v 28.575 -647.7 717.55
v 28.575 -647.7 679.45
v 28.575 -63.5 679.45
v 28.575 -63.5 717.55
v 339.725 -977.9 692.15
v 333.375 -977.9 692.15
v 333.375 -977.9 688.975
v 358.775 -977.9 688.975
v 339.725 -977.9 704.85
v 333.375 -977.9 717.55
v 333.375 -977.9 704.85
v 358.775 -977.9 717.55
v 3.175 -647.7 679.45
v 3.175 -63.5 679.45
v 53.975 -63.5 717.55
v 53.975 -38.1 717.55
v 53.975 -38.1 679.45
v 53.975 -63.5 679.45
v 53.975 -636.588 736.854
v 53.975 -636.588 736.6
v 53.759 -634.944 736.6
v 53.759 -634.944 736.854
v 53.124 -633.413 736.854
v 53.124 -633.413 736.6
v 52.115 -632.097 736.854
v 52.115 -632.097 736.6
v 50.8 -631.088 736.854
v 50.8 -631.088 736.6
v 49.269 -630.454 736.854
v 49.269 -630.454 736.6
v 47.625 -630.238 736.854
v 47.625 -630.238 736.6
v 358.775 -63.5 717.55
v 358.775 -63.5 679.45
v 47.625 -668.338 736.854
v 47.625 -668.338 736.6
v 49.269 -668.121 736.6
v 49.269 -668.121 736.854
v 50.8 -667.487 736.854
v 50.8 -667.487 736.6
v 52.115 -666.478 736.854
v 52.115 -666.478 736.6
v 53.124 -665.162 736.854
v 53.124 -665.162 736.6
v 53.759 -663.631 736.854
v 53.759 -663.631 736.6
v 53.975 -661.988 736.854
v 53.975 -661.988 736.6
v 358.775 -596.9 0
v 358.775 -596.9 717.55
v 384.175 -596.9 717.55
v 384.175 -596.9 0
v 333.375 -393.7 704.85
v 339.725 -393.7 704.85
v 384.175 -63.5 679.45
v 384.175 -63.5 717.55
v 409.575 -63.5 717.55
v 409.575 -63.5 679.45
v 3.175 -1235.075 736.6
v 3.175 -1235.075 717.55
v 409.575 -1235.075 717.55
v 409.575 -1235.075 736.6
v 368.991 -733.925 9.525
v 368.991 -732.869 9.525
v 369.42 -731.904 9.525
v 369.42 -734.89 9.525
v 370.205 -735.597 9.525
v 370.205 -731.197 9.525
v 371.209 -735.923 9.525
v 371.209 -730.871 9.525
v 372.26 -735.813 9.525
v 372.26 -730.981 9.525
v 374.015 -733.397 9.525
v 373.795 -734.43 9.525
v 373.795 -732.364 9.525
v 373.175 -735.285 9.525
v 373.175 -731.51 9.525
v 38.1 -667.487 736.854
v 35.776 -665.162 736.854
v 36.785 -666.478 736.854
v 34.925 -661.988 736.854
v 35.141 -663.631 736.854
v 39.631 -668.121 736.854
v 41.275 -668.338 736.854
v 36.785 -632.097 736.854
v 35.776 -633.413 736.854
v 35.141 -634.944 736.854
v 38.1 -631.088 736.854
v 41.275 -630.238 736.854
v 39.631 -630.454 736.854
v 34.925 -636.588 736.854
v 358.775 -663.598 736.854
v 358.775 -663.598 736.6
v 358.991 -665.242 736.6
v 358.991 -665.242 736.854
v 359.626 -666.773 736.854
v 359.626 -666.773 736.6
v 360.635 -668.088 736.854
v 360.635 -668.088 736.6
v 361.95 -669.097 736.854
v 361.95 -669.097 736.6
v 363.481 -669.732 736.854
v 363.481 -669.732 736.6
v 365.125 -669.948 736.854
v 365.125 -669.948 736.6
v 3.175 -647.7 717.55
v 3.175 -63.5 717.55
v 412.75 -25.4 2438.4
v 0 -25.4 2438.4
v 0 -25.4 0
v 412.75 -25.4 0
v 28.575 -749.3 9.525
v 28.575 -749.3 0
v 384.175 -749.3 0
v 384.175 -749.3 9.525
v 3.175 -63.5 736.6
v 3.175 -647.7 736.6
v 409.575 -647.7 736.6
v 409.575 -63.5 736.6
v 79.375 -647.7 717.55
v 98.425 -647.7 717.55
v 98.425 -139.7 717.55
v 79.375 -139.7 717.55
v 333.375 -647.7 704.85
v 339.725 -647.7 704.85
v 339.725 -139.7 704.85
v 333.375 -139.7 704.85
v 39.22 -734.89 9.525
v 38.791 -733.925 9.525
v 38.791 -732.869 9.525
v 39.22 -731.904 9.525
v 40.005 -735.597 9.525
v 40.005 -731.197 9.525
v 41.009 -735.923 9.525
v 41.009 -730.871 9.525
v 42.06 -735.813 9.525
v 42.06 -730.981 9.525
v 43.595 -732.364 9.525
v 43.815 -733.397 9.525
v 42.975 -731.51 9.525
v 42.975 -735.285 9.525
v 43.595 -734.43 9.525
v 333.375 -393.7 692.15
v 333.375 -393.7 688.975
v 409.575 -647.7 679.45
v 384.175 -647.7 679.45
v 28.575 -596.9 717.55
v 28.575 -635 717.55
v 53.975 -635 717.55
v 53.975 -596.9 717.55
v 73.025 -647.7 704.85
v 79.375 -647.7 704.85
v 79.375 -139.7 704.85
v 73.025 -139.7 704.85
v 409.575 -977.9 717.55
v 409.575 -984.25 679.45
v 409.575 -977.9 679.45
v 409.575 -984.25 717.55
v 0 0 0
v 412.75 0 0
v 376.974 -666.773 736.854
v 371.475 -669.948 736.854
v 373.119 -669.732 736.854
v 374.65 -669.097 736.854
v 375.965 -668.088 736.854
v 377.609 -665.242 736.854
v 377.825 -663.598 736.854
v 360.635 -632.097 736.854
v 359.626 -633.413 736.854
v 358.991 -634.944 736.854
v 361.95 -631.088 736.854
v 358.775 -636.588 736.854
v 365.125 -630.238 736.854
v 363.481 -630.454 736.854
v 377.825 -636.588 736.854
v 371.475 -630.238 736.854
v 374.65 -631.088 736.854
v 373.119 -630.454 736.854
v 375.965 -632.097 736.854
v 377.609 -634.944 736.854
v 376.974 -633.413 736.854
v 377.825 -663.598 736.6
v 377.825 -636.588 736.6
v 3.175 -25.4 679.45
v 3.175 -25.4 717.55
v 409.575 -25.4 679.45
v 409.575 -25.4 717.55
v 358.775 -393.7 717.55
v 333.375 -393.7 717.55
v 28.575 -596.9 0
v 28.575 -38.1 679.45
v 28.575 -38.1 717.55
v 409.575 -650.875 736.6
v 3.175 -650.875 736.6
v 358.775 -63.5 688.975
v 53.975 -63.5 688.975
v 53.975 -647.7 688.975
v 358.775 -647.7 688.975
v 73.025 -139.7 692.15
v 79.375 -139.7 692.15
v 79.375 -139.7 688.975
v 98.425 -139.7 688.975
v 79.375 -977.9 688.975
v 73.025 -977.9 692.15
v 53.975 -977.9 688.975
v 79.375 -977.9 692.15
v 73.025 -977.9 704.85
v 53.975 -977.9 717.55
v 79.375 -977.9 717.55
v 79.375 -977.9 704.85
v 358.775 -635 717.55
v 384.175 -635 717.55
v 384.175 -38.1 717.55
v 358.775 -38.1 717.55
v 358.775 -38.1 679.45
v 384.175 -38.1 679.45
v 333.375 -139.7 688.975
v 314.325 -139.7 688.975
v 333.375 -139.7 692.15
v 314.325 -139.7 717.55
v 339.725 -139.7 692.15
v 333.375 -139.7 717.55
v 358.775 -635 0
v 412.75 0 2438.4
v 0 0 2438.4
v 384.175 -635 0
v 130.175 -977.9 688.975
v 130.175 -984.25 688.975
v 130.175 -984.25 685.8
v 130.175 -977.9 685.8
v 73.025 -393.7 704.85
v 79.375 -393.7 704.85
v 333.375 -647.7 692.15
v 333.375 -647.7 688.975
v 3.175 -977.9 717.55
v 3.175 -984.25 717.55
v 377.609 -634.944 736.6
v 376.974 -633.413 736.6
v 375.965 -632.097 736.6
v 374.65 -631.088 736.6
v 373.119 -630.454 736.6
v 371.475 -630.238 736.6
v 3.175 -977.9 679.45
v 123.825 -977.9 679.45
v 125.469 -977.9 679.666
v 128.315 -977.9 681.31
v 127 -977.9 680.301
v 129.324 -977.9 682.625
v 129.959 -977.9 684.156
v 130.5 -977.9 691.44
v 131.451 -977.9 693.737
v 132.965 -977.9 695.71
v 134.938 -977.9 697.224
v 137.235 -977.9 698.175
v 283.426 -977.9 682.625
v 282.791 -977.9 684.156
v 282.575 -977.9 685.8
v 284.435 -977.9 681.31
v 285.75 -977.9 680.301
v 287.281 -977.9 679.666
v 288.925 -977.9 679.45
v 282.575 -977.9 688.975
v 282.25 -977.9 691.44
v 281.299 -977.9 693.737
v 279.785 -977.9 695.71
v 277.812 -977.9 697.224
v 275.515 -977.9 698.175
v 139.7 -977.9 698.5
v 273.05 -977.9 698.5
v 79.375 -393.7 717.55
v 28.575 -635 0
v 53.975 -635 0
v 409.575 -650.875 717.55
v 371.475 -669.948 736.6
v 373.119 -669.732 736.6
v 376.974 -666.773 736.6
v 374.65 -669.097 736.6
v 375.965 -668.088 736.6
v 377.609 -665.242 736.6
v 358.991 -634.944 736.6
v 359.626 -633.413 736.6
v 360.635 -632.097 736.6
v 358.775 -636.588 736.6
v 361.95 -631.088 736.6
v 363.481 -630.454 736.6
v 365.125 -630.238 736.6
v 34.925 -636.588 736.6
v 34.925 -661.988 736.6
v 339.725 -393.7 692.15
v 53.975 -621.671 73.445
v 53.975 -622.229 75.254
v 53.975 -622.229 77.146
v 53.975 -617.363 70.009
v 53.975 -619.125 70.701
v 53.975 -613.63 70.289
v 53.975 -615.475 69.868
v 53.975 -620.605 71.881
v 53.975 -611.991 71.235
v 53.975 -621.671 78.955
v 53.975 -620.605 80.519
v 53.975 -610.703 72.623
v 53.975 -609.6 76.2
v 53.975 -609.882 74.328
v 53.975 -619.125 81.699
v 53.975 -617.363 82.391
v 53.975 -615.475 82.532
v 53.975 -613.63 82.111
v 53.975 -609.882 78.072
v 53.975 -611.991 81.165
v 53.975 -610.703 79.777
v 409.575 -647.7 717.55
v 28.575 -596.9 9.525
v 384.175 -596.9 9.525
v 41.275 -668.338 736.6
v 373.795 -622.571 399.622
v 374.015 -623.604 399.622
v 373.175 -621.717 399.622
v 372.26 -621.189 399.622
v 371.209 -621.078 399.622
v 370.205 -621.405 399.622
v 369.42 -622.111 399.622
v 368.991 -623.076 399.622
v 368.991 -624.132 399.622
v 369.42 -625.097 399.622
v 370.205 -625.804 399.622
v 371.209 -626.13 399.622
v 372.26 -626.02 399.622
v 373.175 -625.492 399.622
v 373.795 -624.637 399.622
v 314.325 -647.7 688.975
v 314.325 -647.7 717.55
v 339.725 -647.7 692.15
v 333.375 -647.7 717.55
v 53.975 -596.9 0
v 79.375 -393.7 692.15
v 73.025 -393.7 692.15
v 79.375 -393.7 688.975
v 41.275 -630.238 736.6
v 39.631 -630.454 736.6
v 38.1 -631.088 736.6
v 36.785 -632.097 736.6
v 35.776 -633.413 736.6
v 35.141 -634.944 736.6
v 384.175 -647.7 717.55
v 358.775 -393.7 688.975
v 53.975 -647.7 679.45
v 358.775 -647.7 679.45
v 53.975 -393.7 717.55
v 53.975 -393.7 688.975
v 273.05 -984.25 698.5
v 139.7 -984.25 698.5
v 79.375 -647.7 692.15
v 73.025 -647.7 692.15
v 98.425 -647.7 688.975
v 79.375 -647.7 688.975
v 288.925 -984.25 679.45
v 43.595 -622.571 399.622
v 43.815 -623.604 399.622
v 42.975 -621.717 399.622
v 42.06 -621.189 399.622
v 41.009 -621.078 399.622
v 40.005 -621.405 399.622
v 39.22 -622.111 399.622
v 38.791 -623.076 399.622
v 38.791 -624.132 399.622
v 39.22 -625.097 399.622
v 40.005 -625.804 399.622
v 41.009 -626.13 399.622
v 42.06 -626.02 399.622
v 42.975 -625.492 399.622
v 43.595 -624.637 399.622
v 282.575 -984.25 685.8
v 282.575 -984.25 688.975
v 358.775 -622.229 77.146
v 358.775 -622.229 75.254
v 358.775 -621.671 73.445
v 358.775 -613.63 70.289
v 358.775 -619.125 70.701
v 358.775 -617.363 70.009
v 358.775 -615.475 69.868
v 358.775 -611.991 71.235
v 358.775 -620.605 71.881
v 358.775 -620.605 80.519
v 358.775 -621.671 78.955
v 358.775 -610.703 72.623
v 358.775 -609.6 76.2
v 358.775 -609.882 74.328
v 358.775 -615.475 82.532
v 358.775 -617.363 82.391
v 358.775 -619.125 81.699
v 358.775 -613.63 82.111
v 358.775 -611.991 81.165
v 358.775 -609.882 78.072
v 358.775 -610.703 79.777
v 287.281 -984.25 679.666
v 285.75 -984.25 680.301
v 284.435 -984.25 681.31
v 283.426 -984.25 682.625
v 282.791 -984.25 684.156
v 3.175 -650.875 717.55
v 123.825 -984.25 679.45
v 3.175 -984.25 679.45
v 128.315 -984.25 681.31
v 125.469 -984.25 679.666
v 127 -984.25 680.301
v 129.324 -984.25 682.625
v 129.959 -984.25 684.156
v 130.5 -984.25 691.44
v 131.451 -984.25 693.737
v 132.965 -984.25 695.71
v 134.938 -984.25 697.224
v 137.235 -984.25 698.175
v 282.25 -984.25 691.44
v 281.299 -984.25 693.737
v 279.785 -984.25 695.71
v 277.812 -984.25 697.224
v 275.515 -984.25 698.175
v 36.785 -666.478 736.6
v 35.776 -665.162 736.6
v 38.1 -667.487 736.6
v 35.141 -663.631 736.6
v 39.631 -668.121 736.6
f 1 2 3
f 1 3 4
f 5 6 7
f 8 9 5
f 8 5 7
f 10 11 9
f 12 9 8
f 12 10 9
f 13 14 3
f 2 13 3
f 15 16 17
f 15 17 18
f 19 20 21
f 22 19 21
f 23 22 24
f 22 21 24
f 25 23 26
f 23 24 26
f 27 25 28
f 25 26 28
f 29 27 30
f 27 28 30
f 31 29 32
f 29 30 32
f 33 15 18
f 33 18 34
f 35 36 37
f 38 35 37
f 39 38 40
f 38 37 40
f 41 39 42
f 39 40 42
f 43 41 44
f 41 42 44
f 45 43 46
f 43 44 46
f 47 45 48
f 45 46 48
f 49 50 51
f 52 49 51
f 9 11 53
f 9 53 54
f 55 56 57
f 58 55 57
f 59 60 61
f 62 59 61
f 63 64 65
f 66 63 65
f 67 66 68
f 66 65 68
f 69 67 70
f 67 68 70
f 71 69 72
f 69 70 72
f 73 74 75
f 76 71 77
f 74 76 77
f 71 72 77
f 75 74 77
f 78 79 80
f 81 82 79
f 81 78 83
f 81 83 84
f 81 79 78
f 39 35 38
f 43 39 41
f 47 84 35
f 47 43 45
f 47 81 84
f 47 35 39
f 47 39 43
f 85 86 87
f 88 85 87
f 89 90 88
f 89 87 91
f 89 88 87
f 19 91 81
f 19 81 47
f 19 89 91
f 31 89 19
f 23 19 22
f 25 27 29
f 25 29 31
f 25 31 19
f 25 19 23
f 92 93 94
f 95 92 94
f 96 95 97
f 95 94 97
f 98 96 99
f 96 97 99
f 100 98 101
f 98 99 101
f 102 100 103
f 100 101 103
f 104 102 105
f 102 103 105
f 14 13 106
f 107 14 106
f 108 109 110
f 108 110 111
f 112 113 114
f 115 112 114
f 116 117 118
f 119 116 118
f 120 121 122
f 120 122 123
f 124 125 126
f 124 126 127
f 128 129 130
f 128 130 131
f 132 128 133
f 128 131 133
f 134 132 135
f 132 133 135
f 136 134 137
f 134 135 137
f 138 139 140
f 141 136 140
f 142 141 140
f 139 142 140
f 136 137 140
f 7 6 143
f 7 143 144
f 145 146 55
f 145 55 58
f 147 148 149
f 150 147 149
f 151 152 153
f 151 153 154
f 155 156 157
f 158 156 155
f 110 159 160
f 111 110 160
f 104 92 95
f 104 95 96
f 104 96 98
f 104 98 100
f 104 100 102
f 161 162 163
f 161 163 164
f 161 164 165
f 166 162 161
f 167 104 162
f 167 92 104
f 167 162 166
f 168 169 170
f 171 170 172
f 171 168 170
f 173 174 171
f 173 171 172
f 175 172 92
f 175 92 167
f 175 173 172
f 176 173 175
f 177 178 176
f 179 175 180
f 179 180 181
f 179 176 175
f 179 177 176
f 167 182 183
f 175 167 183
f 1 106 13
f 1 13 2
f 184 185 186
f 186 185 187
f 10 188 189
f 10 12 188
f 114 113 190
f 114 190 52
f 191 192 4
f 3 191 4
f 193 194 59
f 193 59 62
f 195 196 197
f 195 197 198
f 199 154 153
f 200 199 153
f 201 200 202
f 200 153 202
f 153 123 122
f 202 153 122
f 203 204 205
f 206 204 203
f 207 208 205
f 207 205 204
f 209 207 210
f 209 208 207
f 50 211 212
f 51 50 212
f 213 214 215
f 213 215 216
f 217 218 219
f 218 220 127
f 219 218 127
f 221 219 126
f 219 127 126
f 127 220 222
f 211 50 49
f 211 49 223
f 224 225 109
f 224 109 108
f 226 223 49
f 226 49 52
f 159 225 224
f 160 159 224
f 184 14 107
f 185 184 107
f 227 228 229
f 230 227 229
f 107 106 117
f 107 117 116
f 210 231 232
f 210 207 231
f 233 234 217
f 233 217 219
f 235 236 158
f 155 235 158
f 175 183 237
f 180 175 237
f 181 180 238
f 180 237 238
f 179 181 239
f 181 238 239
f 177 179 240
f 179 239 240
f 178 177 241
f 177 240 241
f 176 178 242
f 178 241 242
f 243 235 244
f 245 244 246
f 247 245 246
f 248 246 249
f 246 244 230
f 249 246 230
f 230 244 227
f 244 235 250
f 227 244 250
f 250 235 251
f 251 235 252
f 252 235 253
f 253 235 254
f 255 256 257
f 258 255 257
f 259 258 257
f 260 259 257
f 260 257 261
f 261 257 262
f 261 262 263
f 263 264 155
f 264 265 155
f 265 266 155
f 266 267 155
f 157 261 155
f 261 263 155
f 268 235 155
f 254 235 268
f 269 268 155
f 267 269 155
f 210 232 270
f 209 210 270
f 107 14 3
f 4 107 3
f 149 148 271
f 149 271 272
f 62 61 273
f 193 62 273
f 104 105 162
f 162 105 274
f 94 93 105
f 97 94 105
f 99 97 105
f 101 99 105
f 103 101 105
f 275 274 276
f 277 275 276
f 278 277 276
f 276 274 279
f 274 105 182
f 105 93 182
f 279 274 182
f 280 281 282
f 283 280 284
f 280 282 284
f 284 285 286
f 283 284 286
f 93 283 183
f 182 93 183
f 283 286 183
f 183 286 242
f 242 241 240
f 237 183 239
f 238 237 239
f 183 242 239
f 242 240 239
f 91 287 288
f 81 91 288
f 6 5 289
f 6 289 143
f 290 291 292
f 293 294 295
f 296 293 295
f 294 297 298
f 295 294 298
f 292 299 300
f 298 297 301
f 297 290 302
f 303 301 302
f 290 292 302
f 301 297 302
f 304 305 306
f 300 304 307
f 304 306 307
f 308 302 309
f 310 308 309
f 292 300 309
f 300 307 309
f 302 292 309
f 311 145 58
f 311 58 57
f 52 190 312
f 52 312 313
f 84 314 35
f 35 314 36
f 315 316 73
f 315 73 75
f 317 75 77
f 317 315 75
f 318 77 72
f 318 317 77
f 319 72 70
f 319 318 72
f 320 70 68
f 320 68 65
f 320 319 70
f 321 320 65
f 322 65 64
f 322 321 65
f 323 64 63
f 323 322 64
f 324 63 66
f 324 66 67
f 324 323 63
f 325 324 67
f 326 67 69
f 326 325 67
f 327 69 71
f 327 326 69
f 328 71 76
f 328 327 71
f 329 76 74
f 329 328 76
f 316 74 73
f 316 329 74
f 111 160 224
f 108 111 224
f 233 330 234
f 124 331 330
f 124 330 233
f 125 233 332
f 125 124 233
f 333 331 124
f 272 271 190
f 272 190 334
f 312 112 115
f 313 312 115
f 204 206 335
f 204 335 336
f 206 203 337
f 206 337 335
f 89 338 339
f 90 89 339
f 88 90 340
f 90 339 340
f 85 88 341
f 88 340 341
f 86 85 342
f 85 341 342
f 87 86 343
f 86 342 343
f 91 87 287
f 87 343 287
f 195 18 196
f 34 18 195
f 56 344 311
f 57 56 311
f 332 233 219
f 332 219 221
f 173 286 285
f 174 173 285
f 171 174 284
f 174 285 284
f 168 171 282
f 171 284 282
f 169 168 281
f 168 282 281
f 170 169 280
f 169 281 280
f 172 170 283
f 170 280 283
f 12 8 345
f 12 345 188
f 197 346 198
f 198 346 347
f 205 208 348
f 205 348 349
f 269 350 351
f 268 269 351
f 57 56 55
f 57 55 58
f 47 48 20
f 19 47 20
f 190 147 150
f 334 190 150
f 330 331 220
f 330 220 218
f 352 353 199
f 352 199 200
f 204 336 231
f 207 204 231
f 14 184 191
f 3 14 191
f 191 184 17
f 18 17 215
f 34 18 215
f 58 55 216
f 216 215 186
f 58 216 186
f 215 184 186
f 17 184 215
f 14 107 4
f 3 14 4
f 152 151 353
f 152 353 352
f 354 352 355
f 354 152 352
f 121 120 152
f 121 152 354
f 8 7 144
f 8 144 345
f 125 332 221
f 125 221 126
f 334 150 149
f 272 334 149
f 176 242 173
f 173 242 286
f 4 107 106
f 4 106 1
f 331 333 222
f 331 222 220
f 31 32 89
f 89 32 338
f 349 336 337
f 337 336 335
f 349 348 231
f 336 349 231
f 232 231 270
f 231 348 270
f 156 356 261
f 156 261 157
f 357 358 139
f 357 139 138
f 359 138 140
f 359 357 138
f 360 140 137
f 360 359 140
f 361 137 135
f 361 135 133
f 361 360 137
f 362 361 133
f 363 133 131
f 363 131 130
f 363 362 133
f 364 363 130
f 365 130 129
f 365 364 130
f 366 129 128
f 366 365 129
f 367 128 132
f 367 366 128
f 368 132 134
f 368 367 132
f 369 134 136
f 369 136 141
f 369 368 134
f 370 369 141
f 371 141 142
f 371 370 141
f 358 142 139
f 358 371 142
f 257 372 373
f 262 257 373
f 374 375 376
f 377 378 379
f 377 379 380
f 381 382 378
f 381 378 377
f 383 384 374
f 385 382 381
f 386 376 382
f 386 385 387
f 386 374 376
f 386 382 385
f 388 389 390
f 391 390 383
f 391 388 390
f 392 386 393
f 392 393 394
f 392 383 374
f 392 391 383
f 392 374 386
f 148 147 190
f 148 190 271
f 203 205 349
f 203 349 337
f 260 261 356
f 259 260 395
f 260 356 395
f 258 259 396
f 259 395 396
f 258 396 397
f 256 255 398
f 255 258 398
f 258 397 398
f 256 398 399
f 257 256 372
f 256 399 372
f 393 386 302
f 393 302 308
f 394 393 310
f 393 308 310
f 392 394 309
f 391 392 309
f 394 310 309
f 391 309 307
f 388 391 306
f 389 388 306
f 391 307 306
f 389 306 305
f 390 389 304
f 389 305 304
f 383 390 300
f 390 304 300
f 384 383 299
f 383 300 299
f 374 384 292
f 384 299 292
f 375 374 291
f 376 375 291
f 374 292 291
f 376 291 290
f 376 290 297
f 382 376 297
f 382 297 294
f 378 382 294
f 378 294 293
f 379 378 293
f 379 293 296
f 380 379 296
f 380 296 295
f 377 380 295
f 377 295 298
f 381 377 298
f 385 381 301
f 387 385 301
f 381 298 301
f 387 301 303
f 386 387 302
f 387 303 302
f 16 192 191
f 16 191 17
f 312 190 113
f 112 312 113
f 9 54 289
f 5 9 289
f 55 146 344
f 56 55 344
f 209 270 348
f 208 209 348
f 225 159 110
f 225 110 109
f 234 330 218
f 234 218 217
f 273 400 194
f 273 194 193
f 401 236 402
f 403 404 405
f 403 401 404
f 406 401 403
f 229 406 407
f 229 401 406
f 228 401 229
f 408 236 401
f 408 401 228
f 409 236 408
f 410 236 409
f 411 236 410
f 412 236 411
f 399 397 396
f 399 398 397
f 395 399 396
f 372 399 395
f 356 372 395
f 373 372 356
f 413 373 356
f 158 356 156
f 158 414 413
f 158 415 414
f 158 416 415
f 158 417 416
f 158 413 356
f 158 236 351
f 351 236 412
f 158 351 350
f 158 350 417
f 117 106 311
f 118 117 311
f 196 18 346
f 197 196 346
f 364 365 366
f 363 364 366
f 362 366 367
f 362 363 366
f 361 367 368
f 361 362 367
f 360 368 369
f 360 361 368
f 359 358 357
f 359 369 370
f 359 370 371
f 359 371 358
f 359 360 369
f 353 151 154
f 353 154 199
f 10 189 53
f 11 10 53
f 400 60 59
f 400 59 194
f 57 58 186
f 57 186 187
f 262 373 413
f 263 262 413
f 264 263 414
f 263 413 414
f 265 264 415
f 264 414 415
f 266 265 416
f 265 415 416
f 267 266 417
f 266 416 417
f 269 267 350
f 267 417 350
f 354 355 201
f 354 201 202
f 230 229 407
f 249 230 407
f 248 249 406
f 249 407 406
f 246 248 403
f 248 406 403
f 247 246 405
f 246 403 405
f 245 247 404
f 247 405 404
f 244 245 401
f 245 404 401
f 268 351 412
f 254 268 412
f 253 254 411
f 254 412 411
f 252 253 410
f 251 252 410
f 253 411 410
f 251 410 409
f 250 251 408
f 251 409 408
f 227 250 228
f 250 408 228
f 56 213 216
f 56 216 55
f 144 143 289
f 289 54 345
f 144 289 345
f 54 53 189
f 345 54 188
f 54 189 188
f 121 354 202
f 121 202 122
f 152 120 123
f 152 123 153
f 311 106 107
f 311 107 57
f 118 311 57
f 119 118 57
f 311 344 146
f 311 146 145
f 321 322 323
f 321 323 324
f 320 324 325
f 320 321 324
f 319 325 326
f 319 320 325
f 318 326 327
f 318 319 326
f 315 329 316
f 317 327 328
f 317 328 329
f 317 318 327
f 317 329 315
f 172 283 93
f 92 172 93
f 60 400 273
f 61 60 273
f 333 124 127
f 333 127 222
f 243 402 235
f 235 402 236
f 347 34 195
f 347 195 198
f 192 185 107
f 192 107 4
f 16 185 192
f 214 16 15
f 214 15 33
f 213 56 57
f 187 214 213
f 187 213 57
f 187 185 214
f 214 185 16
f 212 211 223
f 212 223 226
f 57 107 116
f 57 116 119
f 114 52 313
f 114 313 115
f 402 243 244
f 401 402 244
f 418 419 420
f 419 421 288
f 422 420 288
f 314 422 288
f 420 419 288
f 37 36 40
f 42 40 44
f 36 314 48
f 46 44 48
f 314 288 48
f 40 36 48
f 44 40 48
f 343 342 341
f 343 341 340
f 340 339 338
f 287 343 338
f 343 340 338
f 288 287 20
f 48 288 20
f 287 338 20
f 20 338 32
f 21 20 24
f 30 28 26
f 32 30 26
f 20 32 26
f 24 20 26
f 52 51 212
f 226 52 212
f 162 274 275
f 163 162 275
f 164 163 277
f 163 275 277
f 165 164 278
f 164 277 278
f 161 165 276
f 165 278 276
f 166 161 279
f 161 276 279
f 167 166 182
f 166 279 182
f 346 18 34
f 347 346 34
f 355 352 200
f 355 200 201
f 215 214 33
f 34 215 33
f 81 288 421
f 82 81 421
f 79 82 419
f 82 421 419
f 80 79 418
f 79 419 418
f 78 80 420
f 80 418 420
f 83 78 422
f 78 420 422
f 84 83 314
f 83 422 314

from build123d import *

# Parameters (mm, degrees)
F0_W           = 412.75
F0_H           = 2438.4
F1_DEPTH       = 25.4
F3_W           = 406.4
F3_H           = 38.1
F4_DEPTH       = 38.1
F5_W           = 406.4
F5_H           = 18.25625
F6_DEPTH       = 577.85
F7_W           = 25.4
F7_H           = 38.1
F8_DEPTH       = 584.2
F10_DEPTH      = 330.2
F10_DEPTH_BACK = 254
F11_W          = 304.8
F11_H          = 38.1
F12_DEPTH      = 6.35
F14_DEPTH      = 508
F15_W          = 329.3162656754
F15_H          = 914.4
F16_DEPTH      = 9.525
F17_W          = 304.8
F17_H          = 584.2
F18_DEPTH      = 9.525
F20_DEPTH      = 25.4
F21_W          = 406.4
F21_H          = 584.2
F22_DEPTH      = 19.05
F23_W          = 25.4
F23_H          = 38.1
F24_DEPTH      = 717.55
F25_W          = 355.6
F25_H          = 152.4
F26_DEPTH      = 9.525
F27_W          = 25.4
F27_H          = 25.4
F28_DEPTH      = 38.1
F34_R          = 2.54
F36_R          = 6.35
F37_DEPTH      = 304.8
F39_W          = 50.8
F39_H          = 38.1
F40_DEPTH      = 6.35
F42_DEPTH      = 0.254


with BuildPart() as f1:
    # F0 (on Front) → F1 (new body)
    with BuildSketch(Plane.XZ):
        with Locations((206.375, 1219.2)):
            Rectangle(F0_W, F0_H)
    extrude(amount=F1_DEPTH)


with BuildPart() as f4:
    # F3 (on face) → F4 (new body)
    with BuildSketch(Plane.XZ.offset(25.4)):
        with Locations((206.375, 698.5)):
            Rectangle(F3_W, F3_H)
    extrude(amount=F4_DEPTH)

    # F27 (on face) → F28 (cut, through all)
    with BuildSketch(Plane(origin=(0, 0, 679.45), x_dir=(1, 0, 0), z_dir=(0, 0, -1))):
        with Locations((41.275, 50.8)):
            Rectangle(F27_W, F27_H)
        with Locations((371.475, 50.8)):
            Rectangle(F27_W, F27_H)
    extrude(amount=-F28_DEPTH, mode=Mode.SUBTRACT)


with BuildPart() as f6:
    # F5 (on face) → F6 (new body, through all)
    with BuildSketch(Plane.XY.offset(717.55)):
        with Locations((206.375, -34.528125)):
            Rectangle(F5_W, F5_H)
    extrude(amount=F6_DEPTH)


with BuildPart() as f6b:
    # F5 (on face) → F6, piece 2 (new body, through all)
    with BuildSketch(Plane.XY.offset(717.55)):
        with Locations((206.375, -54.371875)):
            Rectangle(F5_W, F5_H)
    extrude(amount=F6_DEPTH)


with BuildPart() as f8:
    # F7 (on face) → F8 (new body)
    with BuildSketch(Plane.XZ.offset(63.5)):
        with Locations((15.875, 698.5)):
            Rectangle(F7_W, F7_H)
    extrude(amount=F8_DEPTH)


with BuildPart() as f8b:
    # F7 (on face) → F8, piece 2 (new body)
    with BuildSketch(Plane.XZ.offset(63.5)):
        with Locations((396.875, 698.5)):
            Rectangle(F7_W, F7_H)
    extrude(amount=F8_DEPTH)


with BuildPart() as f10:
    # F9 (on face) → F10 (new body, two sides)
    with BuildSketch(Plane.XZ.offset(647.7)) as f10_sk:
        Polygon((79.375, 717.55), (53.975, 717.55), (53.975, 679.45), (79.375, 679.45), (79.375, 692.15), (73.025, 692.15), (73.025, 704.85), (79.375, 704.85), align=None)
    extrude(amount=F10_DEPTH)
    extrude(f10_sk.sketch, amount=-F10_DEPTH_BACK)


with BuildPart() as f10b:
    # F9 (on face) → F10, piece 2 (new body, two sides)
    with BuildSketch(Plane.XZ.offset(647.7)) as f10_2_sk:
        Polygon((358.775, 717.55), (333.375, 717.55), (333.375, 704.85), (339.725, 704.85), (339.725, 692.15), (333.375, 692.15), (333.375, 679.45), (358.775, 679.45), align=None)
    extrude(amount=F10_DEPTH)
    extrude(f10_2_sk.sketch, amount=-F10_DEPTH_BACK)


with BuildPart() as f12:
    # F11 (on face) → F12 (new body)
    with BuildSketch(Plane.XZ.offset(977.9)):
        with Locations((206.375, 698.5)):
            Rectangle(F11_W, F11_H)
    extrude(amount=F12_DEPTH)

    # F19 (on face) → F20 (cut)
    with BuildSketch(Plane.XZ.offset(984.25)):
        with BuildLine():
            Line((273.05, 698.5), (139.7, 698.5))
            ThreePointArc((139.7, 698.5), (132.9648079092, 695.7101920908), (130.175, 688.975))
            Line((130.175, 688.975), (130.175, 685.8))
            ThreePointArc((130.175, 685.8), (128.3151280605, 681.3098719395), (123.825, 679.45))
            Line((123.825, 679.45), (104.5370513368, 679.45))
            Line((104.5370513368, 679.45), (95.1471963692, 663.4348630905))
            Line((95.1471963692, 663.4348630905), (306.0875535011, 663.4348630905))
            Line((306.0875535011, 663.4348630905), (306.0875535011, 679.45))
            Line((306.0875535011, 679.45), (288.925, 679.45))
            ThreePointArc((288.925, 679.45), (284.4348719395, 681.3098719395), (282.575, 685.8))
            Line((282.575, 685.8), (282.575, 688.975))
            ThreePointArc((282.575, 688.975), (279.7851920908, 695.7101920908), (273.05, 698.5))
        make_face()
    extrude(amount=-F20_DEPTH, mode=Mode.SUBTRACT)

    # F39 (on face) → F40 (join)
    with BuildSketch(Plane.XZ.offset(984.25)):
        with Locations((384.175, 698.5)):
            Rectangle(F39_W, F39_H)
        with Locations((28.575, 698.5)):
            Rectangle(F39_W, F39_H)
    extrude(amount=-F40_DEPTH)


with BuildPart() as f14:
    # F13 (on face) → F14 (new body)
    with BuildSketch(Plane.XZ.offset(647.7)):
        Polygon((98.425, 717.55), (79.375, 717.55), (79.375, 704.85), (73.025, 704.85), (73.025, 692.15), (79.375, 692.15), (79.375, 679.45), (98.425, 679.45), align=None)
    extrude(amount=-F14_DEPTH)


with BuildPart() as f14b:
    # F13 (on face) → F14, piece 2 (new body)
    with BuildSketch(Plane.XZ.offset(647.7)):
        Polygon((333.375, 704.85), (333.375, 717.55), (314.325, 717.55), (314.325, 679.45), (333.375, 679.45), (333.375, 692.15), (339.725, 692.15), (339.725, 704.85), align=None)
    extrude(amount=-F14_DEPTH)


with BuildPart() as f16_tool:
    # F15 (on face) → F16 (new body)
    with BuildSketch(Plane(origin=(0, 0, 679.45), x_dir=(1, 0, 0), z_dir=(0, 0, -1))):
        with Locations((208.811474897, 520.7)):
            Rectangle(F15_W, F15_H)
    extrude(amount=-F16_DEPTH)


with BuildPart() as f10_1:
    add(f10.part)

    # F16: cut by f16_tool
    add(f16_tool.part, mode=Mode.SUBTRACT)


with BuildPart() as f10b_1:
    add(f10b.part)

    # F16: cut by f16_tool
    add(f16_tool.part, mode=Mode.SUBTRACT)


with BuildPart() as f14_1:
    add(f14.part)

    # F16: cut by f16_tool
    add(f16_tool.part, mode=Mode.SUBTRACT)


with BuildPart() as f14b_1:
    add(f14b.part)

    # F16: cut by f16_tool
    add(f16_tool.part, mode=Mode.SUBTRACT)


with BuildPart() as f18:
    # F17 (on face) → F18 (new body, through all)
    with BuildSketch(Plane(origin=(0, 0, 679.45), x_dir=(1, 0, 0), z_dir=(0, 0, -1))):
        with Locations((206.375, 355.6)):
            Rectangle(F17_W, F17_H)
    extrude(amount=-F18_DEPTH)


with BuildPart() as f22:
    # F21 (on face) → F22 (new body)
    with BuildSketch(Plane.XY.offset(717.55)):
        with Locations((206.375, -355.6)):
            Rectangle(F21_W, F21_H)
    extrude(amount=F22_DEPTH)


with BuildPart() as f22b:
    # F21 (on face) → F22, piece 2 (new body)
    with BuildSketch(Plane.XY.offset(717.55)):
        with Locations((206.375, -942.975)):
            Rectangle(F21_W, F21_H)
    extrude(amount=F22_DEPTH)


with BuildPart() as f24:
    # F23 (on face) → F24 (new body, through all)
    with BuildSketch(Plane(origin=(0, 0, 717.55), x_dir=(1, 0, 0), z_dir=(0, 0, -1))):
        with Locations((41.275, 615.95)):
            Rectangle(F23_W, F23_H)
    extrude(amount=F24_DEPTH)


with BuildPart() as f24b:
    # F23 (on face) → F24, piece 2 (new body, through all)
    with BuildSketch(Plane(origin=(0, 0, 717.55), x_dir=(1, 0, 0), z_dir=(0, 0, -1))):
        with Locations((371.475, 615.95)):
            Rectangle(F23_W, F23_H)
    extrude(amount=F24_DEPTH)


with BuildPart() as f26:
    # F25 (on face) → F26 (new body)
    with BuildSketch(Plane(origin=(0, 0, 0), x_dir=(1, 0, 0), z_dir=(0, 0, -1))):
        with Locations((206.375, 673.1)):
            Rectangle(F25_W, F25_H)
    extrude(amount=-F26_DEPTH)


with BuildPart() as f35:
    # F35: sweep along a path in F32
    with BuildLine(Plane.YZ.offset(41.275)) as f35_path:
        Line((-733.3971261978, 9.525), (-635.2745294571, 358.1574260011))
        Line((-635.2745294571, 358.1574260011), (-623.6042869703, 399.622135307))
    # F34 (on face) → F35 (sweep)
    with BuildSketch(Plane.XY.offset(9.525)):
        with Locations((41.275, -733.3971261978)):
            Circle(F34_R)
        with Locations((371.475, -733.3971261978)):
            Circle(F34_R)
    sweep(path=f35_path.line)


with BuildPart() as f37:
    # F36 (on face) → F37 (new body, through all)
    with BuildSketch(Plane.YZ.offset(53.975)):
        with Locations((-615.95, 76.2)):
            Circle(F36_R)
    extrude(amount=F37_DEPTH)


with BuildPart() as f42:
    # F41 (on face) → F42 (new body)
    with BuildSketch(Plane.XY.offset(736.6)):
        with BuildLine():
            Line((47.625, -630.2375), (41.275, -630.2375))
            ThreePointArc((41.275, -630.2375), (36.7848719395, -632.0973719395), (34.925, -636.5875))
            Line((34.925, -636.5875), (34.925, -661.9875))
            ThreePointArc((34.925, -661.9875), (36.7848719395, -666.4776280605), (41.275, -668.3375))
            Line((41.275, -668.3375), (47.625, -668.3375))
            ThreePointArc((47.625, -668.3375), (52.1151280605, -666.4776280605), (53.975, -661.9875))
            Line((53.975, -661.9875), (53.975, -636.5875))
            ThreePointArc((53.975, -636.5875), (52.1151280605, -632.0973719395), (47.625, -630.2375))
        make_face()
    extrude(amount=F42_DEPTH)


with BuildPart() as f42b:
    # F41 (on face) → F42, piece 2 (new body)
    with BuildSketch(Plane.XY.offset(736.6)):
        with BuildLine():
            Line((371.475, -630.2375), (365.125, -630.2375))
            ThreePointArc((365.125, -630.2375), (360.6348719395, -632.0973719395), (358.775, -636.5875))
            Line((358.775, -636.5875), (358.775, -663.5982181152))
            ThreePointArc((358.775, -663.5982181152), (360.6348719395, -668.0883461758), (365.125, -669.9482181152))
            Line((365.125, -669.9482181152), (371.475, -669.9482181152))
            ThreePointArc((371.475, -669.9482181152), (375.9651280605, -668.0883461758), (377.825, -663.5982181152))
            Line((377.825, -663.5982181152), (377.825, -636.5875))
            ThreePointArc((377.825, -636.5875), (375.9651280605, -632.0973719395), (371.475, -630.2375))
        make_face()
    extrude(amount=F42_DEPTH)


solid = Compound([f1.part, f4.part, f8.part, f8b.part, f12.part, f10_1.part, f10b_1.part, f14_1.part, f14b_1.part, f18.part, f22.part, f22b.part, f24.part, f24b.part, f26.part, f35.part, f37.part, f42.part, f42b.part])
